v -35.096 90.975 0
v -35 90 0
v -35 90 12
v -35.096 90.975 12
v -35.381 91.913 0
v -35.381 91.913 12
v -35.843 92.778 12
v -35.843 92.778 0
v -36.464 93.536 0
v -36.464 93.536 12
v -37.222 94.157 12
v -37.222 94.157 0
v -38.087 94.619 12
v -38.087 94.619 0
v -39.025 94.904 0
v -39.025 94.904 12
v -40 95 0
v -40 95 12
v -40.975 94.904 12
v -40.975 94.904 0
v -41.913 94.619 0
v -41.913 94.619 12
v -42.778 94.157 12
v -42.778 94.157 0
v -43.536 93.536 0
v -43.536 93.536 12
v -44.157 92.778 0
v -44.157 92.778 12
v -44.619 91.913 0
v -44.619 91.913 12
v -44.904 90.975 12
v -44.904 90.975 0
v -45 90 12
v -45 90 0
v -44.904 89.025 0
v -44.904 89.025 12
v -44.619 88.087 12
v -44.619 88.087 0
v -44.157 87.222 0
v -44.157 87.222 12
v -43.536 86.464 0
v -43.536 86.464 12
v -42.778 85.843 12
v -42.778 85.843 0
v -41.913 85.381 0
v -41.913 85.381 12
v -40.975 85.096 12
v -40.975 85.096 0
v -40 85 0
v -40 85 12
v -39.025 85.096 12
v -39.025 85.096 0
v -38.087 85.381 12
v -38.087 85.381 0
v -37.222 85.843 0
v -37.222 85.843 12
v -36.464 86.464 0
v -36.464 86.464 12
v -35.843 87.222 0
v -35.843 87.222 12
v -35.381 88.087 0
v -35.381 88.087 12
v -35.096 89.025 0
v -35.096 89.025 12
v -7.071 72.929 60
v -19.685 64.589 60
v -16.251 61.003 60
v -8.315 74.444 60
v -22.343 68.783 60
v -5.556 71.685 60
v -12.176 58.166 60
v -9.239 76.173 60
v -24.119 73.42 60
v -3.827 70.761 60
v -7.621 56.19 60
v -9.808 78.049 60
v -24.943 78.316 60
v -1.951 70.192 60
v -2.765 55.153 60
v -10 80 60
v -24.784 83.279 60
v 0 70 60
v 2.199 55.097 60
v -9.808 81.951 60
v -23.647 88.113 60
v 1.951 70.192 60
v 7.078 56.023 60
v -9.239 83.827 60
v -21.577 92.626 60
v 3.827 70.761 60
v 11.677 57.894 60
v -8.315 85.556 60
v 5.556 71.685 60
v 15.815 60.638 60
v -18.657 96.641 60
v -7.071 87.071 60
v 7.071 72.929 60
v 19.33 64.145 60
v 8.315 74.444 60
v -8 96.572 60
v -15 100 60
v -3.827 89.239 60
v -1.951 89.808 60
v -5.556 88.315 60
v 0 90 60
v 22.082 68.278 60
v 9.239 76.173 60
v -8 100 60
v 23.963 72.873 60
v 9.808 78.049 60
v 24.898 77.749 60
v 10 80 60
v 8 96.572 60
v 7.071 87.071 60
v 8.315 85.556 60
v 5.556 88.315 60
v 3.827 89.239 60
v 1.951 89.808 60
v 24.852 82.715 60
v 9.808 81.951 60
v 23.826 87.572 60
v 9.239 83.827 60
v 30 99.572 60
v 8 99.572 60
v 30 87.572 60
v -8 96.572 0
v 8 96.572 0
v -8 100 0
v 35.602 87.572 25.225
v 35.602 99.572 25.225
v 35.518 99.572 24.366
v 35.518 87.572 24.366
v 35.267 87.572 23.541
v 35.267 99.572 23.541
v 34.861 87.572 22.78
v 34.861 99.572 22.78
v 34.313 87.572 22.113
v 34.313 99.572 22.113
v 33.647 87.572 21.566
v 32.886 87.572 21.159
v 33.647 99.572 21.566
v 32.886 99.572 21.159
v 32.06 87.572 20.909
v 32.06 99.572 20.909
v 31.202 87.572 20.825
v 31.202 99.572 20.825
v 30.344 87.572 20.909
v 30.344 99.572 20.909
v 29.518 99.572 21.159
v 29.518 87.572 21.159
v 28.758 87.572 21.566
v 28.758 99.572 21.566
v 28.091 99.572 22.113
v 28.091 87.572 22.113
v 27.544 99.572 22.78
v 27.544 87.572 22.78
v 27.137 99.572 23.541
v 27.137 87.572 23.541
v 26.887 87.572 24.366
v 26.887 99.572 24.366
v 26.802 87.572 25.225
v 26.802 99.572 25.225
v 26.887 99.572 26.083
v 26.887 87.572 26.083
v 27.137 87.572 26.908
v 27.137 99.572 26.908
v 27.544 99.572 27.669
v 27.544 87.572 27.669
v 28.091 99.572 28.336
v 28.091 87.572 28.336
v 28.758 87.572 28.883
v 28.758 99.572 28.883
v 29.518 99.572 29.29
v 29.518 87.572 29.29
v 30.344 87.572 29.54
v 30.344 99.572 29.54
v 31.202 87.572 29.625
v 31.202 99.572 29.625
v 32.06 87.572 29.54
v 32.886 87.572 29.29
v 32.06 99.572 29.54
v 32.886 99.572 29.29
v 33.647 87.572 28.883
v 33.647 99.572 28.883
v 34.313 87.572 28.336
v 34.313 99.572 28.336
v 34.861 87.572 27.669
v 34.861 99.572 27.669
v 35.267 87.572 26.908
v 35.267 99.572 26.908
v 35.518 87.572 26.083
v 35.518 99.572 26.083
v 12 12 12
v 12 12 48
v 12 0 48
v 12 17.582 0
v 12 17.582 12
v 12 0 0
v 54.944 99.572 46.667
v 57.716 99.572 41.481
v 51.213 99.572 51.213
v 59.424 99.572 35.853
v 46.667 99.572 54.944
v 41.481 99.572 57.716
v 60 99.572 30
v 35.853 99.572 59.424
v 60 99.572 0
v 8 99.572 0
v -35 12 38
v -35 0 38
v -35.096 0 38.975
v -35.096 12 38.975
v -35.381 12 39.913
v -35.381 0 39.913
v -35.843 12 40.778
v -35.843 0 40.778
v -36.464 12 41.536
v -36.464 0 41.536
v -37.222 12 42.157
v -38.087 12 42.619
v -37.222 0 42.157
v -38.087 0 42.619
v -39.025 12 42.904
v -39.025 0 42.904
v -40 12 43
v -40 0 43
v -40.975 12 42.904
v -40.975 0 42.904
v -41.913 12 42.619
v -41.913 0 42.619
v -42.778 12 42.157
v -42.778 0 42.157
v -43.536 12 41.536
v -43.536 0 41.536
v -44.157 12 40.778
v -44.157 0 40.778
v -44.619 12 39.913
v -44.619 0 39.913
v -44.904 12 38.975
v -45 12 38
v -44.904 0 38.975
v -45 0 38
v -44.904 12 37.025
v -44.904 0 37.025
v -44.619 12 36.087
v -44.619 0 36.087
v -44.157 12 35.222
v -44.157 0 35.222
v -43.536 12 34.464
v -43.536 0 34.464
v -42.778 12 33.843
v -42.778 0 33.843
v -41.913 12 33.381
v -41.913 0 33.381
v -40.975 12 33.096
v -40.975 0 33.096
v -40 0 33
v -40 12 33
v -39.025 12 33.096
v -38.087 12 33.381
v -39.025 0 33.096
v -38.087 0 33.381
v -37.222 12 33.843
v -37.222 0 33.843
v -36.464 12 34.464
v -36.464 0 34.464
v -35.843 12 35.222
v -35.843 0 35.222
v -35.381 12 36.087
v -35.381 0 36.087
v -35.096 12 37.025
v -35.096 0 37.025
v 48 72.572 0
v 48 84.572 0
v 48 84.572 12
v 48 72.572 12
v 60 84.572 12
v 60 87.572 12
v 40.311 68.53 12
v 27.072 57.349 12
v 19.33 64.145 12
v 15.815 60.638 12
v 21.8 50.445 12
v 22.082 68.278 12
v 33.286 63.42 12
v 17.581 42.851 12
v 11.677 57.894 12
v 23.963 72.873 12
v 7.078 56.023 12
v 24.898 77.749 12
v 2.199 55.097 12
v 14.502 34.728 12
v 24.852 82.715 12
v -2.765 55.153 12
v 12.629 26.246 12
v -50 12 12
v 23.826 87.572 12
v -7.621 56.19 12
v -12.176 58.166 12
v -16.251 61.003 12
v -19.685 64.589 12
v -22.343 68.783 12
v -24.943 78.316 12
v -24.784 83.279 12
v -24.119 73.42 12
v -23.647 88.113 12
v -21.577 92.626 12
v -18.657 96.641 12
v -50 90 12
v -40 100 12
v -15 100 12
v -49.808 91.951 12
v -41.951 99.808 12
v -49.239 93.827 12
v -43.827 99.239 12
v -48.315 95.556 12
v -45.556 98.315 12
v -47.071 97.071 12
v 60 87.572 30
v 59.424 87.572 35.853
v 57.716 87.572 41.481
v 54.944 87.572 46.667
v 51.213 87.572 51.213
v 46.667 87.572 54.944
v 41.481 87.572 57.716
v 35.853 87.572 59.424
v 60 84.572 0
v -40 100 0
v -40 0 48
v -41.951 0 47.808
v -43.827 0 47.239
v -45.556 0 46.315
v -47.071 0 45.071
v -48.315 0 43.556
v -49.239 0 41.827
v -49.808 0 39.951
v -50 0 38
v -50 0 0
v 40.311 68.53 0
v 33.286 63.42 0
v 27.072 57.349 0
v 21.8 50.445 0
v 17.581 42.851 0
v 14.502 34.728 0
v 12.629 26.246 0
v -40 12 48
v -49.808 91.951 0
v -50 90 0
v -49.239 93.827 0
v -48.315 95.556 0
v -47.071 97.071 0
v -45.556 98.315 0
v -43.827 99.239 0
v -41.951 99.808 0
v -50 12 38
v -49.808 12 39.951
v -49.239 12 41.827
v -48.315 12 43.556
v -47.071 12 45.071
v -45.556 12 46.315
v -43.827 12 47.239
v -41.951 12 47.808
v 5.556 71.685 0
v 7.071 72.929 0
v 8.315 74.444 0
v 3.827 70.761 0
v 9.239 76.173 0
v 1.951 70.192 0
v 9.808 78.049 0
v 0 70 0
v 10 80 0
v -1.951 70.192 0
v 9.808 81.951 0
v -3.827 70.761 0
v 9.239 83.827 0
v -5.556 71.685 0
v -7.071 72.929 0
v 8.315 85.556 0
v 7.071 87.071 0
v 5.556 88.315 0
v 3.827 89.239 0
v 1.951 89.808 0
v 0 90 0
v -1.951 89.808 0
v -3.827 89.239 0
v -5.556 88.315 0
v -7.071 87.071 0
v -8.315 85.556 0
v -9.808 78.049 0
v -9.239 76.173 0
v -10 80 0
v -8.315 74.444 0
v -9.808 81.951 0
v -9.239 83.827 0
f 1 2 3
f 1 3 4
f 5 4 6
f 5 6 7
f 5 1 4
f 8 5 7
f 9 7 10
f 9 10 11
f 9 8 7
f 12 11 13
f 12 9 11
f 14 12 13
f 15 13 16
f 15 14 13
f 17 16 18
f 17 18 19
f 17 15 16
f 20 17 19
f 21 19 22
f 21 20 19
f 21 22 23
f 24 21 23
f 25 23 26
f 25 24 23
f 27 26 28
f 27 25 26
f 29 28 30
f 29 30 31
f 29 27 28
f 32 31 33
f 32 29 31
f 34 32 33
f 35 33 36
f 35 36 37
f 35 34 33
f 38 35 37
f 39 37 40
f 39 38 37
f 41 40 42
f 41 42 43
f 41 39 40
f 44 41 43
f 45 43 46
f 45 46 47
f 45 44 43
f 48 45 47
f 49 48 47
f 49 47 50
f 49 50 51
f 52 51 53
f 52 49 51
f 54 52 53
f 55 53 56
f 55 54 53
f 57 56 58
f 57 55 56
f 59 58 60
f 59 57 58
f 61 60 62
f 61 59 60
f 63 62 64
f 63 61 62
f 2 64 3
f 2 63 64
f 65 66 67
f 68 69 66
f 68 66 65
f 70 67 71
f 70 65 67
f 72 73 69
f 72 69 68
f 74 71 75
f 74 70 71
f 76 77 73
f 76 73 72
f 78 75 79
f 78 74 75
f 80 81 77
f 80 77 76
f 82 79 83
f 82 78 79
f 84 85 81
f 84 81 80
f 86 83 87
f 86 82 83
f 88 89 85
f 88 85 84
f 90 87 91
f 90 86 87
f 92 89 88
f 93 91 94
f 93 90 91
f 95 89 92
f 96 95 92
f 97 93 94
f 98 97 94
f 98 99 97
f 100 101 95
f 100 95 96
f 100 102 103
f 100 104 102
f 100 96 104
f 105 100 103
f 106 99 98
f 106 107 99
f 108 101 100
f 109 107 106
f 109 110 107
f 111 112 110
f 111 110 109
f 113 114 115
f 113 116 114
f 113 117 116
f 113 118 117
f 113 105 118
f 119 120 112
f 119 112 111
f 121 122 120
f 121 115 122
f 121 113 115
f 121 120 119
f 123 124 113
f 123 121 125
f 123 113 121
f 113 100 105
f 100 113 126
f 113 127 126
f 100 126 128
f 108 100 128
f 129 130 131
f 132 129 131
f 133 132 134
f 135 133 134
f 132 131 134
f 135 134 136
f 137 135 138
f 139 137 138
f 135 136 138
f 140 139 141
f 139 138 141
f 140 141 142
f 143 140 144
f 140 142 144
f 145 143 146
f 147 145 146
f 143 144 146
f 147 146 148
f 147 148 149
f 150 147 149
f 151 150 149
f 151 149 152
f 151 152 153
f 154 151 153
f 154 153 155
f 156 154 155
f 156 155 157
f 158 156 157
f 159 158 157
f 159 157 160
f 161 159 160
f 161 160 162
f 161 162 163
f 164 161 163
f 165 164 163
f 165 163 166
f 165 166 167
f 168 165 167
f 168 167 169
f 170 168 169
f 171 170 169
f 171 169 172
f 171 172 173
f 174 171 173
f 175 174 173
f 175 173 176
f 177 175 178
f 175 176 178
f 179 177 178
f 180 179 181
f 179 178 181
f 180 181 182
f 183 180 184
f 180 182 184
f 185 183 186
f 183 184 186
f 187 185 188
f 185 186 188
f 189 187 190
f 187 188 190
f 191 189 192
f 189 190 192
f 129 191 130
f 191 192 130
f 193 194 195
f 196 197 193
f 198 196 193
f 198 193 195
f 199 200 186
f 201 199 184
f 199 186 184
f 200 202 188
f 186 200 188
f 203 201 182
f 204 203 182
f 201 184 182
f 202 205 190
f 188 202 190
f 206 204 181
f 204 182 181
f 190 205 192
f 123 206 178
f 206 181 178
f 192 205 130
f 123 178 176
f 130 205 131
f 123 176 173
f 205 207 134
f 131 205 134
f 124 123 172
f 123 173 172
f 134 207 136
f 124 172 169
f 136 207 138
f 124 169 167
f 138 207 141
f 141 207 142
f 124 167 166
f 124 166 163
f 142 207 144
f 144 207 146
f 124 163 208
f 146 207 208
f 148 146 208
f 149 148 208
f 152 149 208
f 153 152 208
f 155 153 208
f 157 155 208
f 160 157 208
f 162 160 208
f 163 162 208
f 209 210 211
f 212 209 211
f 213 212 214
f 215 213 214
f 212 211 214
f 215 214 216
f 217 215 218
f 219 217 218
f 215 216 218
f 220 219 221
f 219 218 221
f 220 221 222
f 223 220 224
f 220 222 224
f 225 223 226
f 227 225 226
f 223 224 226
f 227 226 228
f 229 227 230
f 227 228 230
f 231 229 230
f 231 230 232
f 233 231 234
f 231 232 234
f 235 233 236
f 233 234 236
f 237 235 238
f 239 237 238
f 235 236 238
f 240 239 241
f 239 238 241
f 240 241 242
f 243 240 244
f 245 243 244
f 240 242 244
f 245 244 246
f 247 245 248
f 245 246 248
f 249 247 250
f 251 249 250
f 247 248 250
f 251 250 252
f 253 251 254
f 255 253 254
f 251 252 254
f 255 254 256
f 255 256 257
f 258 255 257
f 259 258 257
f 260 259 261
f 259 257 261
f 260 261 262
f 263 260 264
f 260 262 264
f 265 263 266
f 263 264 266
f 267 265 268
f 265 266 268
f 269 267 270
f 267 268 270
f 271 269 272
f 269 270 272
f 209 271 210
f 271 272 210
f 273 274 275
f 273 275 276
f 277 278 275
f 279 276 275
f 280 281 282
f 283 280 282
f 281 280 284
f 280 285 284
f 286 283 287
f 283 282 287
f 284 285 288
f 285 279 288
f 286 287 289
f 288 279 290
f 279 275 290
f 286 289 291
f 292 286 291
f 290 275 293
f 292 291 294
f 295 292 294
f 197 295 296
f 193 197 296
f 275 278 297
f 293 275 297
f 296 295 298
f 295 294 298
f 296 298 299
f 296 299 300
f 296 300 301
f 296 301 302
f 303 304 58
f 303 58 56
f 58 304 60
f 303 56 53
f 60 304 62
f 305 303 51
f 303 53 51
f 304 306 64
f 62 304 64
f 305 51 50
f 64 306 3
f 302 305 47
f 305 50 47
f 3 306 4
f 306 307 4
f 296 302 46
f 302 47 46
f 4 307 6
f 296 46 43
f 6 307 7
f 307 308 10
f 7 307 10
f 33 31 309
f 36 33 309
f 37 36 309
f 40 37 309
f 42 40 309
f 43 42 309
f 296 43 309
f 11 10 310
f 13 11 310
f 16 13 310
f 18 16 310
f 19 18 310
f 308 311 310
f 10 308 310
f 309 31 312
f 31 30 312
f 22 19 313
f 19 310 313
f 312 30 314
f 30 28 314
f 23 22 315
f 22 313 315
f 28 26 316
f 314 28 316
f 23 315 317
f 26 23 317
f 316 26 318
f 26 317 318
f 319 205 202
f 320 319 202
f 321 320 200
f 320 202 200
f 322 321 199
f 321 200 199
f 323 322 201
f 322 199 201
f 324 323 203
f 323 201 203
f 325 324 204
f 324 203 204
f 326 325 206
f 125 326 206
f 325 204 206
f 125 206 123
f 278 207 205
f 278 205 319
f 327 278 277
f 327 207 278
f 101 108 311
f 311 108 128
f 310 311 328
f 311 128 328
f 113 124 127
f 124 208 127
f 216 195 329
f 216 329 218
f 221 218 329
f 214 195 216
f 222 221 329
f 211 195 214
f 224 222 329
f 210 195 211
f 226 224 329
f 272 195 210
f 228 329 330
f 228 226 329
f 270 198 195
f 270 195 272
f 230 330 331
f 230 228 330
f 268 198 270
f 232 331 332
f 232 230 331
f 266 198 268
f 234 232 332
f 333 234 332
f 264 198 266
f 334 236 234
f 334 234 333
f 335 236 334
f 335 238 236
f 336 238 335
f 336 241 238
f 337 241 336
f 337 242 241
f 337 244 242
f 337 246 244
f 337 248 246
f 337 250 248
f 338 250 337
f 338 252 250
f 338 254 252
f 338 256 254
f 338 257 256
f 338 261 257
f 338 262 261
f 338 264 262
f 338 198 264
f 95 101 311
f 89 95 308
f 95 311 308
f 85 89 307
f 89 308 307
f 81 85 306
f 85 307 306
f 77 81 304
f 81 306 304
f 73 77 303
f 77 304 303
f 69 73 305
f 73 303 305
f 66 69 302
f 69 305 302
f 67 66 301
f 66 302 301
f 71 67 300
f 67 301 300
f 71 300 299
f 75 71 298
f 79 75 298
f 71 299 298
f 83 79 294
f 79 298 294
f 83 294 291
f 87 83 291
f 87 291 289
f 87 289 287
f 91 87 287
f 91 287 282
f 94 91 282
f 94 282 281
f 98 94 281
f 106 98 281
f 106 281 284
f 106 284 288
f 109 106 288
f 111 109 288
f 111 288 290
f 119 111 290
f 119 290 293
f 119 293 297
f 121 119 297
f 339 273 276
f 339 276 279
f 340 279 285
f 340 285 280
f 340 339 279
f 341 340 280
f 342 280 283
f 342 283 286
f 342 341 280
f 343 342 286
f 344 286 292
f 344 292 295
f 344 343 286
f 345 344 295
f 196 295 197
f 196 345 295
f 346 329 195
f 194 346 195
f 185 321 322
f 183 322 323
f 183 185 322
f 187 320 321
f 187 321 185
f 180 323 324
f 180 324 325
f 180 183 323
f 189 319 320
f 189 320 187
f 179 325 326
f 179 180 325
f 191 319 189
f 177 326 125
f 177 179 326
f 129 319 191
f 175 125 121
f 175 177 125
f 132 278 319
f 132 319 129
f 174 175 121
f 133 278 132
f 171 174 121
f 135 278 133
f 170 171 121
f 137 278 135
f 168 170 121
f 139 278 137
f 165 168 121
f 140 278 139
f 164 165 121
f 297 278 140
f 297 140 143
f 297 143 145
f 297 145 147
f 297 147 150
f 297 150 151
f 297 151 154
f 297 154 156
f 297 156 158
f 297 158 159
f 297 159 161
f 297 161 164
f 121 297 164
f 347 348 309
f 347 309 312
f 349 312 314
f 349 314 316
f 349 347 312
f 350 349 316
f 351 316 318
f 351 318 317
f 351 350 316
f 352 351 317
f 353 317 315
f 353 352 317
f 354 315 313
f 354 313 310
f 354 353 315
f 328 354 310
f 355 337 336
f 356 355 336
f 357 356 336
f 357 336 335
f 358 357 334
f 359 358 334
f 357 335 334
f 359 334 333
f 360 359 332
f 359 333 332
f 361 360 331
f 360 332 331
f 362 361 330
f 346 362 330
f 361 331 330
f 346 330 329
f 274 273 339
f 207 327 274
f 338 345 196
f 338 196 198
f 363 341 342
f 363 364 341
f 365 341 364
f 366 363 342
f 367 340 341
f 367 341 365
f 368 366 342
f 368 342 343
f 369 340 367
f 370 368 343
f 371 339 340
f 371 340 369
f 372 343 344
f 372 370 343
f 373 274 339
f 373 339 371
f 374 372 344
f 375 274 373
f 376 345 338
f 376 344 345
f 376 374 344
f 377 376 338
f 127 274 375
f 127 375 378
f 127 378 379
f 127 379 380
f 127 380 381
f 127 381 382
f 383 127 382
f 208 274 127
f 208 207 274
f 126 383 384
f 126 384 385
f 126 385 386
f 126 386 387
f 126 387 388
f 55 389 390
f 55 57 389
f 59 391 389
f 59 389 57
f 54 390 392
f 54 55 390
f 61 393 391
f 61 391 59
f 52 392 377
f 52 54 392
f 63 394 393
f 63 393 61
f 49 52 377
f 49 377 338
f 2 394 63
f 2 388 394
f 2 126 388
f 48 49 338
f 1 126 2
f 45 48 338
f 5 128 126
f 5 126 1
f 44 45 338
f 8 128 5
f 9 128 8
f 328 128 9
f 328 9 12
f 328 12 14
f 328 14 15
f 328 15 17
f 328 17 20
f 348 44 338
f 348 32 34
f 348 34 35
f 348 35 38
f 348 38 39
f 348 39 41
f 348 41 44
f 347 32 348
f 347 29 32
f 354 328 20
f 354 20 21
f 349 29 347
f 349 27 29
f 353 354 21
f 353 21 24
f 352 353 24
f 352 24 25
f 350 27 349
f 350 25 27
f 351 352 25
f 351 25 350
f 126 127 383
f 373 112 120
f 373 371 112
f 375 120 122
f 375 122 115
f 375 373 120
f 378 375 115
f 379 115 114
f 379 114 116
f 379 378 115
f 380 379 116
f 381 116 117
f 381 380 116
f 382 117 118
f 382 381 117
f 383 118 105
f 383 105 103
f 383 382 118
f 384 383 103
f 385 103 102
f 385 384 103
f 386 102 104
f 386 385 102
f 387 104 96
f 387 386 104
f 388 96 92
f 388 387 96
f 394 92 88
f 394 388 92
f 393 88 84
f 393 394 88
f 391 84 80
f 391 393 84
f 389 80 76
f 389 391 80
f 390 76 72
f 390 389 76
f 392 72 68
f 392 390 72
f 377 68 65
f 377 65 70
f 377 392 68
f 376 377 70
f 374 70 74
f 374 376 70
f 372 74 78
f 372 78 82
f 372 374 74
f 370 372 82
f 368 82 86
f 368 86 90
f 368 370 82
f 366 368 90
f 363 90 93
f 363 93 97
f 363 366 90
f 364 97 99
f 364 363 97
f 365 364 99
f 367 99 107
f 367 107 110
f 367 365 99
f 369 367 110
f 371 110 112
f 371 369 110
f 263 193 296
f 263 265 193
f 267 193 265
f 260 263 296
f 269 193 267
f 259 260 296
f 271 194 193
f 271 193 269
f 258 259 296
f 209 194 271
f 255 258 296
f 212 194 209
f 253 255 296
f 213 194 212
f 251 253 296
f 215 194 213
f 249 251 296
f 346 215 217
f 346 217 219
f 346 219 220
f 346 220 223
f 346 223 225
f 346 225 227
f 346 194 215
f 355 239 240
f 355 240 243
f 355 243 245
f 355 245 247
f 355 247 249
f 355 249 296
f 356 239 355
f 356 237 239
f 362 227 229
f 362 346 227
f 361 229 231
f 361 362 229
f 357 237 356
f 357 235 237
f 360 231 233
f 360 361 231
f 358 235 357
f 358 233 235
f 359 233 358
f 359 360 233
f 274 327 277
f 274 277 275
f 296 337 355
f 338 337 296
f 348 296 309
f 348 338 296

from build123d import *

# Parameters (mm, degrees)
SKETCH2_R           = 5
SKETCH2_R_2         = 10
BOSS_EXTRUDE2_DEPTH = 12
SKETCH3_R           = 5
BOSS_EXTRUDE3_DEPTH = 12
SKETCH4_R           = 10
BOSS_EXTRUDE4_DEPTH = 48
BOSS_EXTRUDE5_DEPTH = 12
SKETCH6_R           = 4.4
CUT_EXTRUDE1_DEPTH  = 100.572444927


with BuildPart() as part:
    # Sketch2 → Boss-Extrude2 (new body)
    with BuildSketch(Plane.XY):
        with BuildLine():
            Line((0, 0), (-50, 0))
            Line((-50, 0), (-50, 90))
            ThreePointArc((-50, 90), (-47.071067812, 97.071067812), (-40, 100))
            Line((-40, 100), (-8, 100))
            Line((-8, 100), (-8, 96.572444927))
            Line((-8, 96.572444927), (8, 96.572444927))
            Line((8, 96.572444927), (8, 99.572444927))
            Line((8, 99.572444927), (60, 99.572444927))
            Line((60, 99.572444927), (60, 84.572444927))
            Line((60, 84.572444927), (48, 84.572444927))
            Line((48, 84.572444927), (48, 72.572444927))
            ThreePointArc((48, 72.572444927), (21.800398408, 50.444890038), (12, 17.581536588))
            Line((12, 17.581536588), (12, 0))
            Line((12, 0), (0, 0))
        make_face()
        with Locations((-40, 90)):
            Circle(SKETCH2_R, mode=Mode.SUBTRACT)
        with Locations((0, 80)):
            Circle(SKETCH2_R_2, mode=Mode.SUBTRACT)
    extrude(amount=BOSS_EXTRUDE2_DEPTH)

    # Sketch3 → Boss-Extrude3 (add)
    with BuildSketch(Plane.XZ):
        with BuildLine():
            Line((-50, 0), (-50, 38))
            ThreePointArc((-50, 38), (-47.071067812, 45.071067812), (-40, 48))
            Line((-40, 48), (12, 48))
            Line((12, 48), (12, 0))
            Line((12, 0), (-50, 0))
        make_face()
        with Locations((-40, 38)):
            Circle(SKETCH3_R, mode=Mode.SUBTRACT)
    extrude(amount=-BOSS_EXTRUDE3_DEPTH)

    # Sketch4 → Boss-Extrude4 (add)
    with BuildSketch(Plane.XY.offset(12)):
        with BuildLine():
            ThreePointArc((-15, 100), (-0.349804116, 55.002447378), (15.553758374, 99.572444927))
            Line((15.553758374, 99.572444927), (8, 99.572444927))
            Line((8, 99.572444927), (8, 96.572444927))
            Line((8, 96.572444927), (-8, 96.572444927))
            Line((-8, 96.572444927), (-8, 100))
            Line((-8, 100), (-15, 100))
        make_face()
        with Locations((0, 80)):
            Circle(SKETCH4_R, mode=Mode.SUBTRACT)
    extrude(amount=BOSS_EXTRUDE4_DEPTH)

    # Sketch5 → Boss-Extrude5 (add)
    with BuildSketch(Plane(origin=(0, 99.572444927, 0), x_dir=(1, 0, 0), z_dir=(0, 1, 0))):
        with BuildLine():
            Line((8, -60), (8, 0))
            Line((8, 0), (60, 0))
            Line((60, 0), (60, -12))
            Line((60, -12), (60, -30))
            ThreePointArc((60, -30), (51.213203436, -51.213203436), (30, -60))
            Line((30, -60), (8, -60))
        make_face()
    extrude(amount=-BOSS_EXTRUDE5_DEPTH)

    # Sketch6 → Cut-Extrude1 (cut, through all)
    with BuildSketch(Plane(origin=(0, 99.572444927, 0), x_dir=(1, 0, 0), z_dir=(0, 1, 0))):
        with Locations((31.202070331, -25.224562722)):
            Circle(SKETCH6_R)
    extrude(amount=-CUT_EXTRUDE1_DEPTH, mode=Mode.SUBTRACT)


solid = part.part
